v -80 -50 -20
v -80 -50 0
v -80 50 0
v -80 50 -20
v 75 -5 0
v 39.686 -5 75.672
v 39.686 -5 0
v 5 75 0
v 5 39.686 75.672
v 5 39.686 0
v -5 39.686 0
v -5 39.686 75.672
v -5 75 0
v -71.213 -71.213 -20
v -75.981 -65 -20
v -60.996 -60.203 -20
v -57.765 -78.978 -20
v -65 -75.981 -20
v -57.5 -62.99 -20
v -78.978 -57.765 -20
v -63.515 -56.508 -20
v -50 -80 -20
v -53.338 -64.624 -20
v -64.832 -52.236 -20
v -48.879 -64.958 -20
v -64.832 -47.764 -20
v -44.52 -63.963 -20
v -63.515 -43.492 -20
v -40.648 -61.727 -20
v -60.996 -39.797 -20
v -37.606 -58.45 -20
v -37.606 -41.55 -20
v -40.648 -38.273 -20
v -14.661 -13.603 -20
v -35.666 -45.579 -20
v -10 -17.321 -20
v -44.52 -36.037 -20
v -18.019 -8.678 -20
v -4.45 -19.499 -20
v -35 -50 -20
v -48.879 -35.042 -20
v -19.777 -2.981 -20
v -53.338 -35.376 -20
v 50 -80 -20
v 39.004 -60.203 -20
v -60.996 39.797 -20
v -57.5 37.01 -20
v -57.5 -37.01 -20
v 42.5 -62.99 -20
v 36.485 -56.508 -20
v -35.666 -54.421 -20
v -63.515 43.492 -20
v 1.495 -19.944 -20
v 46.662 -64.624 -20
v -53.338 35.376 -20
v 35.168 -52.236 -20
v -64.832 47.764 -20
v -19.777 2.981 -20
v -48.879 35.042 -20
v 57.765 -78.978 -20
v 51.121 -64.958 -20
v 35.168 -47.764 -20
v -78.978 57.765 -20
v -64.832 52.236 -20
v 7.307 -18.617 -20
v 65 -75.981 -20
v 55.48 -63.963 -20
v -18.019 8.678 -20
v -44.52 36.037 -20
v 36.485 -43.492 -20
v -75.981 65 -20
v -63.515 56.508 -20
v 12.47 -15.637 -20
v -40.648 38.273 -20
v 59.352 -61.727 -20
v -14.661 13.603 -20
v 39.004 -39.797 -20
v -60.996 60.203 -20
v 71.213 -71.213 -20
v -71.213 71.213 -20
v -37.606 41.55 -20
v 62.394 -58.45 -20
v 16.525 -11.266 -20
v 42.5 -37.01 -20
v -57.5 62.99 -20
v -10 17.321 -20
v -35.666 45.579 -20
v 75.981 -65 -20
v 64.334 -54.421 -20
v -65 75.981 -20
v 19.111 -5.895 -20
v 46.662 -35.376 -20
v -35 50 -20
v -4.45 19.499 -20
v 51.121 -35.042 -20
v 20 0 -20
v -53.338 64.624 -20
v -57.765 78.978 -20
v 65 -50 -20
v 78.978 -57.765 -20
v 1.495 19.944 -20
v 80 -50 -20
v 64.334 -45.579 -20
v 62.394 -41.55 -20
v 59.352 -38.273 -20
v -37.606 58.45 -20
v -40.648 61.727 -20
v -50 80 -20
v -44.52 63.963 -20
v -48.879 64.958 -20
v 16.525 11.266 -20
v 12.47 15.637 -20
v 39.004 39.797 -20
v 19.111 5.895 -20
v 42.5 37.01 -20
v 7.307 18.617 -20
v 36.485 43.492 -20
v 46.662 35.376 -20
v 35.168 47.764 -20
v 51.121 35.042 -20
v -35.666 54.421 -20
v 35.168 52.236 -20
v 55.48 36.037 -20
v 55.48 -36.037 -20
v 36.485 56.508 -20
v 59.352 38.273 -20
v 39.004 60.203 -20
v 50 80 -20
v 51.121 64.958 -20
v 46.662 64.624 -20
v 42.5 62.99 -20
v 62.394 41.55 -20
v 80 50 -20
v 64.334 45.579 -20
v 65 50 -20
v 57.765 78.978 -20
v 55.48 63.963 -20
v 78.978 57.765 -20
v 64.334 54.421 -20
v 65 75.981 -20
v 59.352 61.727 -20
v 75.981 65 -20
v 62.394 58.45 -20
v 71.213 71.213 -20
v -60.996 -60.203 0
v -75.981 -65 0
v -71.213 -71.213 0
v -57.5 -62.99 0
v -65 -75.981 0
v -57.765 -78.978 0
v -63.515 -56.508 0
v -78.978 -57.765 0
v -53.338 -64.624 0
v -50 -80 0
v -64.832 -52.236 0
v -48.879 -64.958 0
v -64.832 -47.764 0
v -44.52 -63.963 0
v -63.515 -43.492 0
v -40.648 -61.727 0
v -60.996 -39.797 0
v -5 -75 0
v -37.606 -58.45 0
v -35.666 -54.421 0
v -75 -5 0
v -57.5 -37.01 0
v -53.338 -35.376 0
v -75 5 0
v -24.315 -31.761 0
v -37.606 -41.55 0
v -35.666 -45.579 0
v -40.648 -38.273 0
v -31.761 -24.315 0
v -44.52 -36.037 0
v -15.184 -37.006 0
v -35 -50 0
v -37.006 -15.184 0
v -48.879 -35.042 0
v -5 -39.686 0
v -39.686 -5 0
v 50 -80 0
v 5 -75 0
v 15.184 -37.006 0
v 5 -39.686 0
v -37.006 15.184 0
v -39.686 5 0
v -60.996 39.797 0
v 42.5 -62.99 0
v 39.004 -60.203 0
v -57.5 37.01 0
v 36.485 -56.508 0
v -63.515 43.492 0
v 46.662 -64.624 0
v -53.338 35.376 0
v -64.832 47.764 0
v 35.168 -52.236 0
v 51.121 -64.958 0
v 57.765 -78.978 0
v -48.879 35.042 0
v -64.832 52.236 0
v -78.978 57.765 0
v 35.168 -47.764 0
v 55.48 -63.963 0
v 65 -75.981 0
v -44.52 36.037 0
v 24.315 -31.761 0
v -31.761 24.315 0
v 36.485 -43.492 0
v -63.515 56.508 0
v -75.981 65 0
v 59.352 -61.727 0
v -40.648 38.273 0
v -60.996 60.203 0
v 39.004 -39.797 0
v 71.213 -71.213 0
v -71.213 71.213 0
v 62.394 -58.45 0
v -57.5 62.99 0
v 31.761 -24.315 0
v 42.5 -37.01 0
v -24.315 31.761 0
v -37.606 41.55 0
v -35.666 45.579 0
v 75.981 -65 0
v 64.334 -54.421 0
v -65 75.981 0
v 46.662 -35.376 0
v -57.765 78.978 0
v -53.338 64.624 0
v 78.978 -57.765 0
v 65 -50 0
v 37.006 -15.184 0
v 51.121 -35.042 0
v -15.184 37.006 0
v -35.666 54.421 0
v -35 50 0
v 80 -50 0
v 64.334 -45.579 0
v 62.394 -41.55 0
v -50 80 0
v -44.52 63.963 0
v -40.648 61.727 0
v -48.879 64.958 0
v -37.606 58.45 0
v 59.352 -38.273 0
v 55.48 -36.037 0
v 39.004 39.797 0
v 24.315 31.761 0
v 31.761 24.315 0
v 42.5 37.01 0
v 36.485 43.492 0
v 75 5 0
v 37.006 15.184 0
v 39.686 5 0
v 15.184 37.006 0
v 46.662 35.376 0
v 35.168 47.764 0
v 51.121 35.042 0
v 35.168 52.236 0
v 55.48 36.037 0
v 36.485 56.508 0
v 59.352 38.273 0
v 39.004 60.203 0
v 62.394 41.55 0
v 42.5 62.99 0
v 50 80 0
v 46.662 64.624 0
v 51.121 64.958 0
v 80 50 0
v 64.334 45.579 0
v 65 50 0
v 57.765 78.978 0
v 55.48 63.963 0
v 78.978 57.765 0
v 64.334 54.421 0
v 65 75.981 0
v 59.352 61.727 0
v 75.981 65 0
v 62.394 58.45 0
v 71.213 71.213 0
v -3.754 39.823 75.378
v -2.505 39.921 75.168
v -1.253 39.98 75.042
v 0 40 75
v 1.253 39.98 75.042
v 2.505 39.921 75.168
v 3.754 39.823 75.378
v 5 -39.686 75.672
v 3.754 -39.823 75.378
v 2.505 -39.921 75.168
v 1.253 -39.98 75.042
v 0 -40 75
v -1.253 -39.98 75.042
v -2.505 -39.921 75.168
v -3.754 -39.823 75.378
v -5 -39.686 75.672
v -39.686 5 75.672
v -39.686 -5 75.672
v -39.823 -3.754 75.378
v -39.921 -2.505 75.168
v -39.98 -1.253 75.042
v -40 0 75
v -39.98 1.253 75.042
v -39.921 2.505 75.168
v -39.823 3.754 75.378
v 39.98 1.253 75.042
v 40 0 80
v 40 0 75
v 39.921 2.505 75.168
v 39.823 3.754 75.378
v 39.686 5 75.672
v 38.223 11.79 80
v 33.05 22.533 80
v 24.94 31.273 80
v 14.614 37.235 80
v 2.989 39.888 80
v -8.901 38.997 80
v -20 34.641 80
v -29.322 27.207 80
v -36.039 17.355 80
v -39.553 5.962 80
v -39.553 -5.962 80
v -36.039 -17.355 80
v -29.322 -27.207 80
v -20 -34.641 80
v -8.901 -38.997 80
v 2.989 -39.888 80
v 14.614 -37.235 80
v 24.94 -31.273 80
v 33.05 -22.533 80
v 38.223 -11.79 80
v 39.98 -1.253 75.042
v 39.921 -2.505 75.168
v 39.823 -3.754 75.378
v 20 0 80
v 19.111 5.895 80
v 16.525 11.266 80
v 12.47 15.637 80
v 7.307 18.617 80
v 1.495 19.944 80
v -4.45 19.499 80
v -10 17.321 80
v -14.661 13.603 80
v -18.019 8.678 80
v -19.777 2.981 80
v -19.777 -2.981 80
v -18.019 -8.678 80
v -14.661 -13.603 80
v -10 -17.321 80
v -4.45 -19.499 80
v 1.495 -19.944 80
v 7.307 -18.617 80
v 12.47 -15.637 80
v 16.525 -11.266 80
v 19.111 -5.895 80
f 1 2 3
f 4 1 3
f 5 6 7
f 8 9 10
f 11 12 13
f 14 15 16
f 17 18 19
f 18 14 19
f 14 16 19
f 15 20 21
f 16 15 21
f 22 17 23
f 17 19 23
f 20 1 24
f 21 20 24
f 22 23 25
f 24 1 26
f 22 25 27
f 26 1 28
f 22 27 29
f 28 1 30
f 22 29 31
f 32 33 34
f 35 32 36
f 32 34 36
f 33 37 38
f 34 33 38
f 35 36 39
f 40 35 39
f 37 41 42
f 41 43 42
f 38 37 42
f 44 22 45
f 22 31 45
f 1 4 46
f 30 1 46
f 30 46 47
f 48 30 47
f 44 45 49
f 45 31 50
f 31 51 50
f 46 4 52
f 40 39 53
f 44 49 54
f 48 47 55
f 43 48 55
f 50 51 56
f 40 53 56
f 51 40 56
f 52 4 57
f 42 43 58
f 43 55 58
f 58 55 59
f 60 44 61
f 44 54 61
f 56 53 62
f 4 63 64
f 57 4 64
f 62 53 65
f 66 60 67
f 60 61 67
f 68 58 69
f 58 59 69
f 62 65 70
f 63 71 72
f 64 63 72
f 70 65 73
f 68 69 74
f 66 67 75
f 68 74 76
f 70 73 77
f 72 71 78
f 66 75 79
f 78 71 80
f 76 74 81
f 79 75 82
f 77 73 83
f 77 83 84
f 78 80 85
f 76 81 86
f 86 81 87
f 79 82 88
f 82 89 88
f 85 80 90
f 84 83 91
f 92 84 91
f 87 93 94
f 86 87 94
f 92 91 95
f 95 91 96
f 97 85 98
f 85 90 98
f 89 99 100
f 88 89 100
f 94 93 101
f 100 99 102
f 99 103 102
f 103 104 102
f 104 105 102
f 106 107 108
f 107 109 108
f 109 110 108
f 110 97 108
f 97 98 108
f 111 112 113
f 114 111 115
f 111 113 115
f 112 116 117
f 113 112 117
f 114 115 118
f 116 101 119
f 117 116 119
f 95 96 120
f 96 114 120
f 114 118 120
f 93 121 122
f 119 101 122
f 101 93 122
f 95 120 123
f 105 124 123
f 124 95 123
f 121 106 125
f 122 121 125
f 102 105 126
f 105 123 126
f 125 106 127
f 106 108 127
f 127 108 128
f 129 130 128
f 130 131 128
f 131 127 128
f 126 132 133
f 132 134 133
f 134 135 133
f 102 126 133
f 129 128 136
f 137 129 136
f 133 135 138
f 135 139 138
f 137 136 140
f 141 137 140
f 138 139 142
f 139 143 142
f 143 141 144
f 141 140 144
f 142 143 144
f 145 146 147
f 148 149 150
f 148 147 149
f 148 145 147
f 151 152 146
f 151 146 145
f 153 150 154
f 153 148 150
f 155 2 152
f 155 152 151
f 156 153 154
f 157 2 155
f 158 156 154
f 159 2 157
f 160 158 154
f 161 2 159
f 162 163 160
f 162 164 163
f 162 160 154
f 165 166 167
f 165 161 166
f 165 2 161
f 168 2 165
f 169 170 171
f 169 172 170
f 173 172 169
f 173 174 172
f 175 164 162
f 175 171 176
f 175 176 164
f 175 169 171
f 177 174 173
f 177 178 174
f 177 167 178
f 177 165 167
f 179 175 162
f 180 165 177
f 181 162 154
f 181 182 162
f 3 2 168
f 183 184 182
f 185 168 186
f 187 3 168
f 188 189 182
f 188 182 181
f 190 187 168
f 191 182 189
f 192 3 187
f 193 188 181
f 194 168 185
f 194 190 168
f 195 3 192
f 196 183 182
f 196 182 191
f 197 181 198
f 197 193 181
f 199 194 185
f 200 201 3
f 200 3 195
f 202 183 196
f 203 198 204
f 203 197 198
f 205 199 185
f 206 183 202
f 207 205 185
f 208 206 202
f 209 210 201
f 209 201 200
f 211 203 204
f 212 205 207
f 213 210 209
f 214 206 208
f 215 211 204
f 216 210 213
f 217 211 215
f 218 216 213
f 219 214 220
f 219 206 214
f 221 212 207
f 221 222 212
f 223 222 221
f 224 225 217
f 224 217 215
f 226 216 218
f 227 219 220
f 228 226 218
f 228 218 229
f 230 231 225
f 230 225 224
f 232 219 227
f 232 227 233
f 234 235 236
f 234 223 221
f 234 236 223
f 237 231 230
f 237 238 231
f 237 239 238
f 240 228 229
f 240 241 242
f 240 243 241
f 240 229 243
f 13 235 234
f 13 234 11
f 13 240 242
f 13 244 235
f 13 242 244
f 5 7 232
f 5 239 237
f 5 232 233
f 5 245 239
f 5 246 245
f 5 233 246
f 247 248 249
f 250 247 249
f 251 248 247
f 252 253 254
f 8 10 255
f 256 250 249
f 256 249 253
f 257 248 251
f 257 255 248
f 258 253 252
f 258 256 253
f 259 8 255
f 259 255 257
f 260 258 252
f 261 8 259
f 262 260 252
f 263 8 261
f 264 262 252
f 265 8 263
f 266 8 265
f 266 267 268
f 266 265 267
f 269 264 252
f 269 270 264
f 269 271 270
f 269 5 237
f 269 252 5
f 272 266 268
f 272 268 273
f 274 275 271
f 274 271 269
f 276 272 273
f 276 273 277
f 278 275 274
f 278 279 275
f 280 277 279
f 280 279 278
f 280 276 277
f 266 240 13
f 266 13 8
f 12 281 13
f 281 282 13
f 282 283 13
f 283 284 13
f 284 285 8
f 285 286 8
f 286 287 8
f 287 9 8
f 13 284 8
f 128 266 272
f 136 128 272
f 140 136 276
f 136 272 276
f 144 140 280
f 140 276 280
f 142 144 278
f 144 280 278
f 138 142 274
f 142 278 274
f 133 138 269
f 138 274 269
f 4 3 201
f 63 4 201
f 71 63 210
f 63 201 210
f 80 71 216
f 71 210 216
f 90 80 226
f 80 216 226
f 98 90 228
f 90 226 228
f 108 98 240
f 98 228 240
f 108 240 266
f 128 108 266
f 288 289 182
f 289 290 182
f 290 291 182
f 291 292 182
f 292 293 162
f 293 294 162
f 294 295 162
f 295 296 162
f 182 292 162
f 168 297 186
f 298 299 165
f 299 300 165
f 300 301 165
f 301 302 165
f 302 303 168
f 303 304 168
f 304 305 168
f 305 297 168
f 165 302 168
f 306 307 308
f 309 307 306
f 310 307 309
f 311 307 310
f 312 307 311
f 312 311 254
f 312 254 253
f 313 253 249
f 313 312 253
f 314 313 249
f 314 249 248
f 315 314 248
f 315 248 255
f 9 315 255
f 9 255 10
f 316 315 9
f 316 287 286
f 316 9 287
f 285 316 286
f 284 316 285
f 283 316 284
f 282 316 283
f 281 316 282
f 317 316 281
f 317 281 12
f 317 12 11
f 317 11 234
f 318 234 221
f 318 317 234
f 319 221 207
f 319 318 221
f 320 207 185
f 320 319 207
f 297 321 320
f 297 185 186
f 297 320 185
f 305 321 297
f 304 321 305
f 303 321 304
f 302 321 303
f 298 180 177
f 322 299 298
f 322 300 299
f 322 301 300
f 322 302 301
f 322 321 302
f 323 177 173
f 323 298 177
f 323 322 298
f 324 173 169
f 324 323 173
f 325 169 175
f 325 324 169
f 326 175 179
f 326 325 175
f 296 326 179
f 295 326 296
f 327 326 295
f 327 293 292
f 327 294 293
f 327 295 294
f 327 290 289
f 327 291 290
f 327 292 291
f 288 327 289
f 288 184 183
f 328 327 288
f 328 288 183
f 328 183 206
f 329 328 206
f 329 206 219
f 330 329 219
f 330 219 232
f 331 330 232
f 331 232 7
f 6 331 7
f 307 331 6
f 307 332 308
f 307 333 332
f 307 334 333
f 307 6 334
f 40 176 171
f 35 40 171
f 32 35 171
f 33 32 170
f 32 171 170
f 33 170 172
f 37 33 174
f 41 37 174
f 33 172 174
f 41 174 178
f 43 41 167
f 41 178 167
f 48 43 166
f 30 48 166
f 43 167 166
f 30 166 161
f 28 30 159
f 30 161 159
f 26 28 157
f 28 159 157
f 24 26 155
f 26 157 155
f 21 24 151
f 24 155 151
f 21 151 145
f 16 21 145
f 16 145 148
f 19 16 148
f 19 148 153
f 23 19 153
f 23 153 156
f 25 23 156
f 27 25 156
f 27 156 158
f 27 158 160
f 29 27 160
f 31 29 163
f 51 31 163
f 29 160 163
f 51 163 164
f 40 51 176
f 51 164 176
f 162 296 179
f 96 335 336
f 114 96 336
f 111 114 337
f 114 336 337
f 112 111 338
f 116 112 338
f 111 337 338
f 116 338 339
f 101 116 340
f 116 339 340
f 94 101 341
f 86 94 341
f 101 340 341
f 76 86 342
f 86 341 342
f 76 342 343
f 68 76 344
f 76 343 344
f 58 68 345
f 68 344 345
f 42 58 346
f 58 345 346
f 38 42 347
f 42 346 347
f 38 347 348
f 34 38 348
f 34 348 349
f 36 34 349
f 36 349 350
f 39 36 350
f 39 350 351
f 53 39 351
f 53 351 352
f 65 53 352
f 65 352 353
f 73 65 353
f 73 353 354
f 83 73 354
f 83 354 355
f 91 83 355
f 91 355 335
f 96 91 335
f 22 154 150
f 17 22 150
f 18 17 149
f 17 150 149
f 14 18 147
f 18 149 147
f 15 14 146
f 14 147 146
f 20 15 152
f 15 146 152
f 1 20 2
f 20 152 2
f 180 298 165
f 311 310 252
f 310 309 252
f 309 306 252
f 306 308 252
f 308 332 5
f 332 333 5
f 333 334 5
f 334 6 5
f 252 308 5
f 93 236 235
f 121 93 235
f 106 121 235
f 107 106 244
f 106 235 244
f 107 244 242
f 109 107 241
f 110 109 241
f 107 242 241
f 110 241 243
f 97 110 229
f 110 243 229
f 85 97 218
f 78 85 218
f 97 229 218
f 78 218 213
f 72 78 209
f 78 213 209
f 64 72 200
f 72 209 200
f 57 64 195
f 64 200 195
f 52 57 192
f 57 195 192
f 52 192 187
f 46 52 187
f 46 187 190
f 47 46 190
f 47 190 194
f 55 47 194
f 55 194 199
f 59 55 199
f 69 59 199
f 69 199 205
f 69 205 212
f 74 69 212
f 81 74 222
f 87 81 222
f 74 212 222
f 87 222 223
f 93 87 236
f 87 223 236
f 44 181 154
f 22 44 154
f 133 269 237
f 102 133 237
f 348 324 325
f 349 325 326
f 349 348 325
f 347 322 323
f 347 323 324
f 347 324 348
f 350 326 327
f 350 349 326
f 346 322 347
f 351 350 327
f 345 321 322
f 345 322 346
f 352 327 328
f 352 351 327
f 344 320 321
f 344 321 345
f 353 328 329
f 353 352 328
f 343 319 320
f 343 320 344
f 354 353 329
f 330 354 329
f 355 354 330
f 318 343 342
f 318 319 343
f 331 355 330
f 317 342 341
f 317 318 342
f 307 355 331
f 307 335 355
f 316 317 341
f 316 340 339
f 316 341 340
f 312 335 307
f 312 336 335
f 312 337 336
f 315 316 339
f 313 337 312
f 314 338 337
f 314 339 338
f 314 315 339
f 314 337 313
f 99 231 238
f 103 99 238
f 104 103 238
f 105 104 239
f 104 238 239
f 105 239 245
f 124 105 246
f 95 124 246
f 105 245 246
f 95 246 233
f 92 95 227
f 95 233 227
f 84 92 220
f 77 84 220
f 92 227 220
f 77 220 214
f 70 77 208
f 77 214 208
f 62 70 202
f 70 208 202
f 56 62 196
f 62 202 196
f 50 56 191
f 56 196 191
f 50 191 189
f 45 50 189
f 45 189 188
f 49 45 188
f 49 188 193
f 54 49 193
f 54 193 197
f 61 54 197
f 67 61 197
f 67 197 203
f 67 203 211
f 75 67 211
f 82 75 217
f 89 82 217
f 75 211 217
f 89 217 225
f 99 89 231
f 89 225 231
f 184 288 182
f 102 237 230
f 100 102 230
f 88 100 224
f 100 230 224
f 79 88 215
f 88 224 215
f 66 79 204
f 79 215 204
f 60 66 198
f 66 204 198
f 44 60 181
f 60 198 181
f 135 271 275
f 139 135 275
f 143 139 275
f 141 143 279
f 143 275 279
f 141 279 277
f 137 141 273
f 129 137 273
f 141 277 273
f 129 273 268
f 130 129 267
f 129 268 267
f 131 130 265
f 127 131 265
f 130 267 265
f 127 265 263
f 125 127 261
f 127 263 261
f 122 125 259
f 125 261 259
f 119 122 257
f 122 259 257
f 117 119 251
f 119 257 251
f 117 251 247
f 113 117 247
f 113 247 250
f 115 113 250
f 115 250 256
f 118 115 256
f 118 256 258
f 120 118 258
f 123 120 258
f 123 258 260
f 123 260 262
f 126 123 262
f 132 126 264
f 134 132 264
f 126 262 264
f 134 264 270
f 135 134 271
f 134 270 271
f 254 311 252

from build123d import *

# Parameters (mm, degrees)
SKETCH1_R           = 15
SKETCH1_R_2         = 20
BOSS_EXTRUDE1_DEPTH = 20
BOSS_EXTRUDE2_START = 80
SKETCH1_4_R         = 40
SKETCH1_4_R_2       = 20
BOSS_EXTRUDE2_DEPTH = 80
RIB14_REACH         = 140.564
SKETCH2_WALL_W      = 361.892855998
SKETCH2_WALL_H      = 10
CIRPATTERN1_COUNT   = 4


with BuildPart() as part:
    # Sketch1 → Boss-Extrude1 (new body)
    with BuildSketch(Plane.XY):
        with BuildLine():
            Line((50, 80), (-50, 80))
            ThreePointArc((-50, 80), (-71.213203436, 71.213203436), (-80, 50))
            Line((-80, 50), (-80, -50))
            ThreePointArc((-80, -50), (-71.213203436, -71.213203436), (-50, -80))
            Line((-50, -80), (50, -80))
            ThreePointArc((50, -80), (71.213203436, -71.213203436), (80, -50))
            Line((80, -50), (80, 50))
            ThreePointArc((80, 50), (71.213203436, 71.213203436), (50, 80))
        make_face()
        with Locations((-50, -50)):
            Circle(SKETCH1_R, mode=Mode.SUBTRACT)
        with Locations((50, -50)):
            Circle(SKETCH1_R, mode=Mode.SUBTRACT)
        with Locations((-50, 50)):
            Circle(SKETCH1_R, mode=Mode.SUBTRACT)
        with Locations((50, 50)):
            Circle(SKETCH1_R, mode=Mode.SUBTRACT)
        Circle(SKETCH1_R_2, mode=Mode.SUBTRACT)
    extrude(amount=-BOSS_EXTRUDE1_DEPTH)

    # Sketch1<4> → Boss-Extrude2 (add)
    with BuildSketch(Plane.XY.offset(BOSS_EXTRUDE2_START)):
        Circle(SKETCH1_4_R)
        Circle(SKETCH1_4_R_2, mode=Mode.SUBTRACT)
    extrude(amount=-BOSS_EXTRUDE2_DEPTH)

    # Sketch2 wall → Rib14 (add, up to next)
    with BuildSketch(Plane(origin=(57.5, 0, 37.5), x_dir=(0.422885465331, 0, -0.906183139995), z_dir=(-0.906183139995, 0, -0.422885465331)), mode=Mode.PRIVATE) as rib14_sk1:
        Rectangle(SKETCH2_WALL_W, SKETCH2_WALL_H)
    rib14_tool1 = extrude(rib14_sk1.sketch, amount=RIB14_REACH, mode=Mode.PRIVATE) - part.part
    rib14 = rib14_tool1.solids().sort_by_distance((57.5, 0, 37.5))[0]
    add(rib14)

    # CirPattern1: Rib14 ×4 about axis
    cirpattern1_axis = Axis((0, 0, 80), (0, 0, 1))
    for i in range(1, CIRPATTERN1_COUNT):
        add(rib14.rotate(cirpattern1_axis, i * 360 / CIRPATTERN1_COUNT))


solid = part.part
